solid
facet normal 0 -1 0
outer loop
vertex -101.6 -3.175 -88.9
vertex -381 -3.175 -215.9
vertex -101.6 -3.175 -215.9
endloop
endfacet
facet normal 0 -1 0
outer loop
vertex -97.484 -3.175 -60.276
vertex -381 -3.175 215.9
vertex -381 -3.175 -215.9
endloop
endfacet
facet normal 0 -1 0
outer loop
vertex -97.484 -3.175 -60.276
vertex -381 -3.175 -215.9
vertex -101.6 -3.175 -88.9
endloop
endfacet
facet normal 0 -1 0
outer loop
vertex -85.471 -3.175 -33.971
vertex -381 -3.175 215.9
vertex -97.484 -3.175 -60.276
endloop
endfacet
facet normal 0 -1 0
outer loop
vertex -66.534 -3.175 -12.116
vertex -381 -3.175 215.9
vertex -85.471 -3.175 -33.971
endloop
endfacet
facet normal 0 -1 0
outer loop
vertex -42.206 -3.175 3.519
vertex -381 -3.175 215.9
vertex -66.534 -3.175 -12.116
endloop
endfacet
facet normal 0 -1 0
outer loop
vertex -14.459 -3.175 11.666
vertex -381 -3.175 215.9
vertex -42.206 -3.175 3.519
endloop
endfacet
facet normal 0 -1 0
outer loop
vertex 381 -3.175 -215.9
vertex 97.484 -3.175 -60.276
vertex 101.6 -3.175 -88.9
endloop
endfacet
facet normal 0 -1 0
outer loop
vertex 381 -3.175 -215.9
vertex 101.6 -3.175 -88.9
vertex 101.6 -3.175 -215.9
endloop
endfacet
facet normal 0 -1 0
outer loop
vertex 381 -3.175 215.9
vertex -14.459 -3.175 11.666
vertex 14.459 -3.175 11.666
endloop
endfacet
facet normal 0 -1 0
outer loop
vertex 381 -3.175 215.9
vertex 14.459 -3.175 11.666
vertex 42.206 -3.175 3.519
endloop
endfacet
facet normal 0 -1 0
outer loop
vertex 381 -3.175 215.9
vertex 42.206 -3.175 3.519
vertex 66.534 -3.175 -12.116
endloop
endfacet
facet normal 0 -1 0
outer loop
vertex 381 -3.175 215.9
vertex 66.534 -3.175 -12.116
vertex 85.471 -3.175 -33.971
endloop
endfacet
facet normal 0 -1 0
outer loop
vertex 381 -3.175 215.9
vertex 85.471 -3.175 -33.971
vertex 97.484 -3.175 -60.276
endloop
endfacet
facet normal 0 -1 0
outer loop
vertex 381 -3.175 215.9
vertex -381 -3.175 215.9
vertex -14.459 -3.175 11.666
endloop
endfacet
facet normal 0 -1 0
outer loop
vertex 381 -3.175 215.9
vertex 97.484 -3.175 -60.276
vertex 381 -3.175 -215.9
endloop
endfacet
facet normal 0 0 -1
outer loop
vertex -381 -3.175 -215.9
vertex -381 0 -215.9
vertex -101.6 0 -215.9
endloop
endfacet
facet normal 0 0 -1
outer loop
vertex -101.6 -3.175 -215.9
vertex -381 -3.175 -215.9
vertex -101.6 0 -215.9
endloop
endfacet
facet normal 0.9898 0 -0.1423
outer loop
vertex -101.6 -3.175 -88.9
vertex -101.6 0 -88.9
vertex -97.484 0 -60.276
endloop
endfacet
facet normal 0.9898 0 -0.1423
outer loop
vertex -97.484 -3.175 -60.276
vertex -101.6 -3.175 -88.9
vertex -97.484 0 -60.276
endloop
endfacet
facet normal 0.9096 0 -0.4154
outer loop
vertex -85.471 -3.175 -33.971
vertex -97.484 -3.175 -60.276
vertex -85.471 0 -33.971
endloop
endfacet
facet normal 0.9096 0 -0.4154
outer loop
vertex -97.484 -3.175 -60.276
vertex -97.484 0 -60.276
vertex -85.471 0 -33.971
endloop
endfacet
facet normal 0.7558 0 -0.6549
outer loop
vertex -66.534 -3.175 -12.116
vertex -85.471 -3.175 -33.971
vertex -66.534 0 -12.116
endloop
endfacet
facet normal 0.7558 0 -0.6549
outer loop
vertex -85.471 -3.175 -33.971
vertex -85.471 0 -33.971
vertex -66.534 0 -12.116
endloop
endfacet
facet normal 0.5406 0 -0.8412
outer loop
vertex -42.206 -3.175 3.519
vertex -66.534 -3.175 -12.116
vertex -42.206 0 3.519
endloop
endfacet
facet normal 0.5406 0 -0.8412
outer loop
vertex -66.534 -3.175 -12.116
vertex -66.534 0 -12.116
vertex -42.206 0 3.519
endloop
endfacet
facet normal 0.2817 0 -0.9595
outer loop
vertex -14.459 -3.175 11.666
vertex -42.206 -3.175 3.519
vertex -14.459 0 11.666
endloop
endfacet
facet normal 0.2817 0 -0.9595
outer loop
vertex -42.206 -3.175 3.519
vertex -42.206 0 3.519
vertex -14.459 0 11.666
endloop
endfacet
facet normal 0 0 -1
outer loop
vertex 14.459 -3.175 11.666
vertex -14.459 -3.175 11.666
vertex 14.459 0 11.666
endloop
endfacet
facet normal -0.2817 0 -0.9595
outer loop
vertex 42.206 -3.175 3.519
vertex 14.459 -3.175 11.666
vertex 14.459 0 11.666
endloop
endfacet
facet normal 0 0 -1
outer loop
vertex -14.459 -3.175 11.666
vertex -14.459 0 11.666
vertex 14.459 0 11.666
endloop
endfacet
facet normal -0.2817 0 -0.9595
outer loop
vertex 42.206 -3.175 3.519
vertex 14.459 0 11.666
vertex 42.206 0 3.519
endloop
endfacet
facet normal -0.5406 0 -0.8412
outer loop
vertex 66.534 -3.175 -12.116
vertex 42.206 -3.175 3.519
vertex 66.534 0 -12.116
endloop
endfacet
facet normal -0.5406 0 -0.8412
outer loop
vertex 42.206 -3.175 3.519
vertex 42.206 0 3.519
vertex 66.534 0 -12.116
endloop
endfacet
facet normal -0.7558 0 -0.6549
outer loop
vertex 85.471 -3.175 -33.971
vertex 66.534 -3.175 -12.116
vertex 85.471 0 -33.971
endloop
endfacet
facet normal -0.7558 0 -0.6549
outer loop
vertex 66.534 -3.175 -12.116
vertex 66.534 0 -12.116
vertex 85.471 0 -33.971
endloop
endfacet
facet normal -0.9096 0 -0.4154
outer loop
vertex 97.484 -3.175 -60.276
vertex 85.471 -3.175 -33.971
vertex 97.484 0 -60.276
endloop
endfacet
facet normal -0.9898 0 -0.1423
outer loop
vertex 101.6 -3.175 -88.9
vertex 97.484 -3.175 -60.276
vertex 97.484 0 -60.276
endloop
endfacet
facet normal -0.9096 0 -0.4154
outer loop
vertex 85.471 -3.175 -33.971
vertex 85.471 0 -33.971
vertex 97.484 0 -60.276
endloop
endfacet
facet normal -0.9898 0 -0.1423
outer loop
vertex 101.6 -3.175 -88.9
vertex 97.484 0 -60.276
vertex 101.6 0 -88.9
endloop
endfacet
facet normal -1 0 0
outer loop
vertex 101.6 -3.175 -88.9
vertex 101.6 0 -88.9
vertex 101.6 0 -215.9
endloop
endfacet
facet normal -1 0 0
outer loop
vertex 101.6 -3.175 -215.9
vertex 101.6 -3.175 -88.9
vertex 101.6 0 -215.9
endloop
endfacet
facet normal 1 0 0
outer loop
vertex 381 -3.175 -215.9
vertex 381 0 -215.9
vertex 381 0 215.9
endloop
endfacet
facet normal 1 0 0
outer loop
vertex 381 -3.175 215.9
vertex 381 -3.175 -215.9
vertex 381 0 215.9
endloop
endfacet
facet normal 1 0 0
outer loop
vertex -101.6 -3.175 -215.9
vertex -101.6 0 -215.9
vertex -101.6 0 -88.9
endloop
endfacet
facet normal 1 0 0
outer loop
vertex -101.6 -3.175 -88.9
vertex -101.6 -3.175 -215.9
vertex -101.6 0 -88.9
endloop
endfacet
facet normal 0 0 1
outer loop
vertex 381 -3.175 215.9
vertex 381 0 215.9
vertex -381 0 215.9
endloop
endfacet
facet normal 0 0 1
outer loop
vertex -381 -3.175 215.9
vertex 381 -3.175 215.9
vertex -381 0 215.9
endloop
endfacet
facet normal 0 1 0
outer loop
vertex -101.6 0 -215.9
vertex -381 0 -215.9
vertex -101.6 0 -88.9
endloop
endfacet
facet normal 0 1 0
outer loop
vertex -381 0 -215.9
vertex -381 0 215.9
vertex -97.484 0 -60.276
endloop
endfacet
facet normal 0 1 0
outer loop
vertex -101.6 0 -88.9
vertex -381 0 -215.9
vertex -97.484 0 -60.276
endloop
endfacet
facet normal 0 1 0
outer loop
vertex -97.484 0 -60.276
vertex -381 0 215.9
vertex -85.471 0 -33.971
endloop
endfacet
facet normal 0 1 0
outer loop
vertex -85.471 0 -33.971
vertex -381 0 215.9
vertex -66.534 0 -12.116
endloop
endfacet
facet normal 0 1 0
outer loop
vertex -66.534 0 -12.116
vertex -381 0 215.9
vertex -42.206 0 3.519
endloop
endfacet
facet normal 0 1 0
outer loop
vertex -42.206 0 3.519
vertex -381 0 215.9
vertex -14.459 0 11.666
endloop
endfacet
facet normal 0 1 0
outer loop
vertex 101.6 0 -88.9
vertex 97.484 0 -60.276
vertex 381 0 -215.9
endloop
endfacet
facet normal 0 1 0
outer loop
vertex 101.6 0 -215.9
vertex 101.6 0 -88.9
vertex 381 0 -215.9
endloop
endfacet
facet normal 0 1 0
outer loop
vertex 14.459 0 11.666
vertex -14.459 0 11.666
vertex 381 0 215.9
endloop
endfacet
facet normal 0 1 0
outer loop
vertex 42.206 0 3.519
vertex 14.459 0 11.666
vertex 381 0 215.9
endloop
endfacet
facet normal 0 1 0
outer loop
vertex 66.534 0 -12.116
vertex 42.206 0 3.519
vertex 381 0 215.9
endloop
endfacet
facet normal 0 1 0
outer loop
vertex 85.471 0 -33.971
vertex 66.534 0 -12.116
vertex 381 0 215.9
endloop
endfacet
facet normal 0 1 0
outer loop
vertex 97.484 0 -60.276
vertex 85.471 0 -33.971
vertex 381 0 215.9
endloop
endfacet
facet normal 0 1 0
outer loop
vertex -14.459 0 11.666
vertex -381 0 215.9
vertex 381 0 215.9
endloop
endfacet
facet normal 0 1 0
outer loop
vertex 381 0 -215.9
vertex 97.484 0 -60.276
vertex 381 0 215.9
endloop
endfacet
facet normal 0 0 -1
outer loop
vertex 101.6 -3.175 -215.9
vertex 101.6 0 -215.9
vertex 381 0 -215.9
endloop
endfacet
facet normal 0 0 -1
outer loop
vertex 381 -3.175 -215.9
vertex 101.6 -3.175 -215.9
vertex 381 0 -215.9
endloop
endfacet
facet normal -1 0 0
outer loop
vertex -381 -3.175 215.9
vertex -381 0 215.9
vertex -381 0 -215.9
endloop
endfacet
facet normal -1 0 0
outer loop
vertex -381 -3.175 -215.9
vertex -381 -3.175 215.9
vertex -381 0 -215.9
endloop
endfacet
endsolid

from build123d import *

# Parameters (mm, degrees)
F1_DEPTH = 3.175


# Not quite as in the source:
# - a length typed as a fraction of an inch, garbled in the dataset ("3 / 203.2 mm" for 3/8 in), is restored


with BuildPart() as f1:
    # F0 (on Front) → F1 (new body)
    with BuildSketch(Plane.XZ):
        with BuildLine():
            Line((381, -215.9), (381, 215.9))
            Line((381, 215.9), (-381, 215.9))
            Line((-381, 215.9), (-381, -215.9))
            Line((-381, -215.9), (-101.6, -215.9))
            Line((-101.6, -215.9), (-101.6, -88.9))
            ThreePointArc((-101.6, -88.9), (0, 12.7), (101.6, -88.9))
            Line((101.6, -88.9), (101.6, -215.9))
            Line((101.6, -215.9), (381, -215.9))
        make_face()
    extrude(amount=F1_DEPTH)


solid = f1.part
